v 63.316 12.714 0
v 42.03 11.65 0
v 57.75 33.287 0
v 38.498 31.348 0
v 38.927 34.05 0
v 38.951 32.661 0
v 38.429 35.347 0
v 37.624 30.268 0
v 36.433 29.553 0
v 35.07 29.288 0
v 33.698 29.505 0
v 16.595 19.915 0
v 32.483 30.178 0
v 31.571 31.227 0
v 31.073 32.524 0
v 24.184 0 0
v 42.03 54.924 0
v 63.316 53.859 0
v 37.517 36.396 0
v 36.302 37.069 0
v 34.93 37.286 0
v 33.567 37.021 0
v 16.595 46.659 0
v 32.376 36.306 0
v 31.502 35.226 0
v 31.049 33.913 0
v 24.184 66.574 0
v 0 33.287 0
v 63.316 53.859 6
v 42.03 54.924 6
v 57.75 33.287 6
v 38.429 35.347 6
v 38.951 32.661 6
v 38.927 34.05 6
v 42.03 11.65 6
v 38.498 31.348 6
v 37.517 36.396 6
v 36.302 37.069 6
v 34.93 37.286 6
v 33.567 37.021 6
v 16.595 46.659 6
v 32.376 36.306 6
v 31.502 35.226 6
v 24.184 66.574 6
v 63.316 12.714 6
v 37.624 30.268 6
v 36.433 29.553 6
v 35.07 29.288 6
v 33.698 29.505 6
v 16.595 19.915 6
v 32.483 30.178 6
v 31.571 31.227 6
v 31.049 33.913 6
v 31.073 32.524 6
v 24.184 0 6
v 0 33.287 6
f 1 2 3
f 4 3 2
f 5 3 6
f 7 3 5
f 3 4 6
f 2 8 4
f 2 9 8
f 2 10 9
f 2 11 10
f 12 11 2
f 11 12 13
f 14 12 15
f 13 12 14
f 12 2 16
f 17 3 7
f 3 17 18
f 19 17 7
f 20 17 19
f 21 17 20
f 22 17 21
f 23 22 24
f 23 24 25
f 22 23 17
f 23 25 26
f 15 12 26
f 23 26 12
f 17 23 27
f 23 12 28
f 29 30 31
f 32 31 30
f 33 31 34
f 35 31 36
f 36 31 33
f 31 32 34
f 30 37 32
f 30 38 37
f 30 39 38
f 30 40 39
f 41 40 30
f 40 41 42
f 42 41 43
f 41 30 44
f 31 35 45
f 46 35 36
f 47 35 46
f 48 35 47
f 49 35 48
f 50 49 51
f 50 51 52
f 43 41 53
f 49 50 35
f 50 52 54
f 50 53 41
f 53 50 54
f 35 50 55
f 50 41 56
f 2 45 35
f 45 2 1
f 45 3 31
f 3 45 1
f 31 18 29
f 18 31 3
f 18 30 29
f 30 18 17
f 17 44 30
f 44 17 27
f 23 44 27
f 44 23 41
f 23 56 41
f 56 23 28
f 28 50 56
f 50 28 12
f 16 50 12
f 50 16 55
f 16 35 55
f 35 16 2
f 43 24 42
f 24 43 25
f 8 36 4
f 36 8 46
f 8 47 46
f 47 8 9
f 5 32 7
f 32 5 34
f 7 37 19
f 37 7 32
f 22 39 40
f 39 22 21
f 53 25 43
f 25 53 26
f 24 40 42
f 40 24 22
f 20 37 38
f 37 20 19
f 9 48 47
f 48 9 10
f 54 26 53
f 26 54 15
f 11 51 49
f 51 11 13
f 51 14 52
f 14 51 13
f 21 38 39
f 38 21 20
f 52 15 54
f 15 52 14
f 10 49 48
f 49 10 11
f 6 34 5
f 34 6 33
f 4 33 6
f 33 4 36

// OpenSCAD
$fn = 32;

// ----------------------------------------------------------------------
// Star wheel: 5-point blunt, R35
// ----------------------------------------------------------------------

// --- parameters (mm) ---
n_points = 5;             // number of points / teeth
r_out = 35;               // tip radius
r_in = 22.75;             // root radius
bore_r = 4;               // centre bore radius
plate_t = 6;              // plate thickness, Z (extrusion height)
bore_d = 8;               // centre bore diameter
fit_tol = 0.05;           // declared fit tolerance (prompt contract)
free_tol = 0.2;           // declared free tolerance (prompt contract)

profile = [[0, 33.287], [16.595, 19.915], [24.184, 0], [42.03, 11.65], [63.316, 12.714], [57.75, 33.287], [63.316, 53.859], [42.03, 54.924], [24.184, 66.574], [16.595, 46.659]];  // primary outline, 10 points, counter clockwise
void_1 = [[38.927, 34.05], [38.429, 35.347], [37.517, 36.396], [36.302, 37.069], [34.93, 37.286], [33.567, 37.021], [32.376, 36.306], [31.502, 35.226], [31.049, 33.913], [31.073, 32.524], [31.571, 31.227], [32.483, 30.178], [33.698, 29.505], [35.07, 29.288], [36.433, 29.553], [37.624, 30.268], [38.498, 31.348], [38.951, 32.661]];  // centre bore, 18 points

// --- the one profile operation ---
difference() {
  linear_extrude(height = plate_t) polygon(points = profile);
  translate([0, 0, -1])
    linear_extrude(height = plate_t + 2) polygon(points = void_1);
}
